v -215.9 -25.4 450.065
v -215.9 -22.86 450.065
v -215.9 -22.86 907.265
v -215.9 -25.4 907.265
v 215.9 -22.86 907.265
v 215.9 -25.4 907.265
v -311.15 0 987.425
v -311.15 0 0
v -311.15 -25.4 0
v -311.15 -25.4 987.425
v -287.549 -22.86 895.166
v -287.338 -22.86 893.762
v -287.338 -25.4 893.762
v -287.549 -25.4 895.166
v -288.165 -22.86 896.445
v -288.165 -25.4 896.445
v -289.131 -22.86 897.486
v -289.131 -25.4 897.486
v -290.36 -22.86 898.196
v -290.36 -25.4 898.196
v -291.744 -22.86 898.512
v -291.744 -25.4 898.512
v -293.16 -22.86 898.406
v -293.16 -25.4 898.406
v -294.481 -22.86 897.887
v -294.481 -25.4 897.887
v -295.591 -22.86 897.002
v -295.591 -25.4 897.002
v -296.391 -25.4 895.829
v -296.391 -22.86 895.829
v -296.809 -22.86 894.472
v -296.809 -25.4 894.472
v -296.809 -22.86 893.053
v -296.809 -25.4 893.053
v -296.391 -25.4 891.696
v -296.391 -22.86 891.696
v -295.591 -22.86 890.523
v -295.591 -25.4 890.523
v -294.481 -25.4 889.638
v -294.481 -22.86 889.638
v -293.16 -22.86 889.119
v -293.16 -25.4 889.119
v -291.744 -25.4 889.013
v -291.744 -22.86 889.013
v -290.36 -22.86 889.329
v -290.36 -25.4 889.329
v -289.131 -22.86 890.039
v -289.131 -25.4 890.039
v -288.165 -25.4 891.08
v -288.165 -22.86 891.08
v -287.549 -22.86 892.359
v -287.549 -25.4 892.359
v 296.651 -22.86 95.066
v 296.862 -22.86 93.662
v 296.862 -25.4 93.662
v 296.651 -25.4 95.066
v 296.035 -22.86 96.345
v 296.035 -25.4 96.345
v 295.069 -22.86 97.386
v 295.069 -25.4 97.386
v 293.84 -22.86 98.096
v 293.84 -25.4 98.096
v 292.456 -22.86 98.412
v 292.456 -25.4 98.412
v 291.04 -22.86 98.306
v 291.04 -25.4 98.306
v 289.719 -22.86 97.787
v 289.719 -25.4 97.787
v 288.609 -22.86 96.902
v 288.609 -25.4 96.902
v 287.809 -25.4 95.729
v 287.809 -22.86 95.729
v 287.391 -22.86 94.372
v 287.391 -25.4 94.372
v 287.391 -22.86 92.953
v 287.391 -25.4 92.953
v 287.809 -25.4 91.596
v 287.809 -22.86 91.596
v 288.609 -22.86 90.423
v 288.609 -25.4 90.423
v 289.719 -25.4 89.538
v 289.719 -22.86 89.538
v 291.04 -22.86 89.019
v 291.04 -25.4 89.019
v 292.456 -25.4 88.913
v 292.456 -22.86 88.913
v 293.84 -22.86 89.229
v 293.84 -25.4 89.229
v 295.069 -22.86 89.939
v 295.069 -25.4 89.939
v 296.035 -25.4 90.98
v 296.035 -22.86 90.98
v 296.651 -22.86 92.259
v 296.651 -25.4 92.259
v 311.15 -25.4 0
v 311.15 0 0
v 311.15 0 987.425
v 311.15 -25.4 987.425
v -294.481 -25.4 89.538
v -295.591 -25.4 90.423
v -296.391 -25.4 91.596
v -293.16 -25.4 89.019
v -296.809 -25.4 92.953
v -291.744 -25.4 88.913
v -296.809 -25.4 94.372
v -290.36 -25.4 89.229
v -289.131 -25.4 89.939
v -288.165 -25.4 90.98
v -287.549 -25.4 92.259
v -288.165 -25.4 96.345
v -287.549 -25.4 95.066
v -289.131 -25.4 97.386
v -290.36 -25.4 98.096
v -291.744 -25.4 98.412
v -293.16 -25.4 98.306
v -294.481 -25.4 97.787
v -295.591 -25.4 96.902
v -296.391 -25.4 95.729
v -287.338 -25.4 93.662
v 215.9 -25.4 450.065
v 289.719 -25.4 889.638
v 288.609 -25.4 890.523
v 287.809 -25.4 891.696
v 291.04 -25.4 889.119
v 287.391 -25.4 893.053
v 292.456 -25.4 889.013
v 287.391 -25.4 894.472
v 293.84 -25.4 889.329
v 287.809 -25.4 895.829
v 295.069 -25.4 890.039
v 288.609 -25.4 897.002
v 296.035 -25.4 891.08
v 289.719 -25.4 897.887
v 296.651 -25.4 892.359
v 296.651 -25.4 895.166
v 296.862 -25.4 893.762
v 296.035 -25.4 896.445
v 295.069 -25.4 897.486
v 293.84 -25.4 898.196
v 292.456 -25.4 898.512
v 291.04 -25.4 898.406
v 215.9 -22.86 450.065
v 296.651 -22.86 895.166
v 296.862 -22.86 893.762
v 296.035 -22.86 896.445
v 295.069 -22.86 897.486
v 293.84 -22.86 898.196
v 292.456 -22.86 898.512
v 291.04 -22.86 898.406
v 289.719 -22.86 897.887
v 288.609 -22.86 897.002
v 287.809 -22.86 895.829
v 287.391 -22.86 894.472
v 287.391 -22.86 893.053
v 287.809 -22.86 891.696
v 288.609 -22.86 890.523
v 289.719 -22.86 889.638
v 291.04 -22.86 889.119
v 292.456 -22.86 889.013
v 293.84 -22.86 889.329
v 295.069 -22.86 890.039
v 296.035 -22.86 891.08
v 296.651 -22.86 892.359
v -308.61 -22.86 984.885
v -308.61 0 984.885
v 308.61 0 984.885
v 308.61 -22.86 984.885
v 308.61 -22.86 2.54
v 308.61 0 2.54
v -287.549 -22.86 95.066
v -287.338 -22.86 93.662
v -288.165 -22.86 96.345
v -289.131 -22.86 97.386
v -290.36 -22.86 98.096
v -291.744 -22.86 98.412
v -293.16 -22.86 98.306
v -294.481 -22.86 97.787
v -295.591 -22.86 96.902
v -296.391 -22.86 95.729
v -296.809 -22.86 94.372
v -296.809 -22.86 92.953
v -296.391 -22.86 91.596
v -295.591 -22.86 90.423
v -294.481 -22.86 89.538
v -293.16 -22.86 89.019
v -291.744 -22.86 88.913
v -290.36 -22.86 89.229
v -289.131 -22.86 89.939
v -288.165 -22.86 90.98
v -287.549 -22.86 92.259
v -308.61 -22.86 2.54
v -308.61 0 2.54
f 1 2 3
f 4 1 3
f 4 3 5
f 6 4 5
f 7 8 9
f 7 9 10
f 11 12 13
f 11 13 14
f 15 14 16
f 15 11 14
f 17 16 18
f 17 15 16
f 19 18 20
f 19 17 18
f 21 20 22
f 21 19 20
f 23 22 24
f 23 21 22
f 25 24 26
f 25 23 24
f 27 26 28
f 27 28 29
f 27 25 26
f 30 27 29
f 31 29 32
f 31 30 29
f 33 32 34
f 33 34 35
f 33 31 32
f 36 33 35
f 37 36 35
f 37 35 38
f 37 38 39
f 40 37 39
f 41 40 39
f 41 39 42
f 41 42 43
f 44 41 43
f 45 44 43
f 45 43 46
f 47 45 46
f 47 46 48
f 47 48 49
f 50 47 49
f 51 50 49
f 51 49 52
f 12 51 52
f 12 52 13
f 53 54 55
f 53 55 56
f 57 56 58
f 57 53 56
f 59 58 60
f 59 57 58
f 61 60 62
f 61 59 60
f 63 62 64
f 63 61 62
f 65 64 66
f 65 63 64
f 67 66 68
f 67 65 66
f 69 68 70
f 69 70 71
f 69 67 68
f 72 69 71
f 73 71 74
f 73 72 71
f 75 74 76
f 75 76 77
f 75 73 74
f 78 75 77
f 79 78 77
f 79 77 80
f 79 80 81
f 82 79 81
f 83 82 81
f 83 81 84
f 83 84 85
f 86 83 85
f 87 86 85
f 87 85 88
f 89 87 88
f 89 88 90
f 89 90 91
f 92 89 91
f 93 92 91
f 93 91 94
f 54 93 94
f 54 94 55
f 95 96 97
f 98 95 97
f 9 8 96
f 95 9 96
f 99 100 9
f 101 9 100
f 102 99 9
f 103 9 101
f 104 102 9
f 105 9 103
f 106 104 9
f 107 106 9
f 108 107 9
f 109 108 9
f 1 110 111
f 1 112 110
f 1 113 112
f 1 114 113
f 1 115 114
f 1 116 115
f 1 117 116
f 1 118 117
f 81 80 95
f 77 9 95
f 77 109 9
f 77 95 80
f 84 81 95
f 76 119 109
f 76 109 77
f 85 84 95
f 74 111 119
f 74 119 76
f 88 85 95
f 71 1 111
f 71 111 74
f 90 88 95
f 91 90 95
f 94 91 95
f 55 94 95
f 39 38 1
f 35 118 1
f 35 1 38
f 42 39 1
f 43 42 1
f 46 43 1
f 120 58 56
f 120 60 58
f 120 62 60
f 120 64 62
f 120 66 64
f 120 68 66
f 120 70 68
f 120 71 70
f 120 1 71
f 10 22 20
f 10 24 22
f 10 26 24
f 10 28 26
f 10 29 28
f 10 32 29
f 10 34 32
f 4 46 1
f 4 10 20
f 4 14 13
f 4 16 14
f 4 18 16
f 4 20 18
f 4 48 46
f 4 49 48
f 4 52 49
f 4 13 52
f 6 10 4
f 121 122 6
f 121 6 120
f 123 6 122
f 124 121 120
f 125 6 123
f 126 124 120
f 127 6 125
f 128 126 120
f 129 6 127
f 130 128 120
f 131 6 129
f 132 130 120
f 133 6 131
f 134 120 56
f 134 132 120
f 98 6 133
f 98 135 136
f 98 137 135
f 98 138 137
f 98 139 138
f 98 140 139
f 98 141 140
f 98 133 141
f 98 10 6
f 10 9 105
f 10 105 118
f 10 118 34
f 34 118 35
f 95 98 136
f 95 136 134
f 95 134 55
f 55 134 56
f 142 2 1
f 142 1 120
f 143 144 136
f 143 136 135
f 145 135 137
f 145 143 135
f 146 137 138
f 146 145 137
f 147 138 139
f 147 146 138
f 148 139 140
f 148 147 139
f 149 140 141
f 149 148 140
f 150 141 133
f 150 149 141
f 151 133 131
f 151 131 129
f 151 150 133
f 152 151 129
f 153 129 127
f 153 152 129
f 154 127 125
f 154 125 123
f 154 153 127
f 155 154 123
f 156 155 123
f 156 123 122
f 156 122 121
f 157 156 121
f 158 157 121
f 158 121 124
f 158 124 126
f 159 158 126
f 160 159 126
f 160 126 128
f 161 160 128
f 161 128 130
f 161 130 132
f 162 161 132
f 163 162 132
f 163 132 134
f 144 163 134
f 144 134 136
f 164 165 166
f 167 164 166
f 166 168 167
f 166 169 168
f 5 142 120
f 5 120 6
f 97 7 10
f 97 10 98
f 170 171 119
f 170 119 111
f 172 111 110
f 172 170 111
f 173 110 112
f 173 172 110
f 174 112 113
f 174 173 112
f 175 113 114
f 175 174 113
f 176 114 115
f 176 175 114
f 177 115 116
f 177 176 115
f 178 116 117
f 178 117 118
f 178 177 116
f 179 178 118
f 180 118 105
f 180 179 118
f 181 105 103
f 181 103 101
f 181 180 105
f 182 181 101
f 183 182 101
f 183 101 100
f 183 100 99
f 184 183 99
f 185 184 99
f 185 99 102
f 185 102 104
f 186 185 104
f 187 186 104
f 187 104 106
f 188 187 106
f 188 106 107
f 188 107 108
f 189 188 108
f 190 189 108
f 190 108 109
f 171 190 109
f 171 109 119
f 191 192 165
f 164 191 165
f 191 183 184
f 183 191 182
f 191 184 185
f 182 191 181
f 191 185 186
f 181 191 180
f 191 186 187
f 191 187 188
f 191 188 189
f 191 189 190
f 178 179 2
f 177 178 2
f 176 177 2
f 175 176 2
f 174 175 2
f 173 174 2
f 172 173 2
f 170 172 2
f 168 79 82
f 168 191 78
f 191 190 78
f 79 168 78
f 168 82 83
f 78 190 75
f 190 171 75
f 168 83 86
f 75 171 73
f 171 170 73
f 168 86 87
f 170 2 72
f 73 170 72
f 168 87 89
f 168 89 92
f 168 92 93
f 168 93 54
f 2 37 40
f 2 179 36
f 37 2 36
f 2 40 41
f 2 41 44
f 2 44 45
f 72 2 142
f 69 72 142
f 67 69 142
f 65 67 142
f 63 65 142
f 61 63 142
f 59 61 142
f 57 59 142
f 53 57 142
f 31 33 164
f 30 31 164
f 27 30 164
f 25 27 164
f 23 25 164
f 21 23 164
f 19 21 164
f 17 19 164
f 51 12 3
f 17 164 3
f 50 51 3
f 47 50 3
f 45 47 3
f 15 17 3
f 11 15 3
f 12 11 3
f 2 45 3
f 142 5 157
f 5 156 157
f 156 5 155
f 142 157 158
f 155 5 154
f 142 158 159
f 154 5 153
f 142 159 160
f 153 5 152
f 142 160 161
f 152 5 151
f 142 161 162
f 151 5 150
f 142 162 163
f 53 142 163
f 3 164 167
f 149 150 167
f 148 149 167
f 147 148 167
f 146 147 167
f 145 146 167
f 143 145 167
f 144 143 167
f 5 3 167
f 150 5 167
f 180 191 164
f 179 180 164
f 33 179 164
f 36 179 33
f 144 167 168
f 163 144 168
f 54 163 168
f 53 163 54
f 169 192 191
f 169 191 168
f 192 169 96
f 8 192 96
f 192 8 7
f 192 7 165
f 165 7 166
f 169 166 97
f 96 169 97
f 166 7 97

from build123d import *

# Parameters (mm, degrees)
F0_W     = 622.3
F0_H     = 987.425
F0_R     = 4.7625
F0_W_2   = 431.8
F0_H_2   = 457.2
F1_DEPTH = 25.4
F2_T     = -2.54
F3_W     = 617.22
F3_H     = 22.86
F4_DEPTH = 982.345


with BuildPart() as f1:
    # F0 (on Front) → F1 (new body)
    with BuildSketch(Plane.XZ):
        with Locations((0, 493.7125)):
            Rectangle(F0_W, F0_H)
        with Locations((-292.1, 93.6625)):
            Circle(F0_R, mode=Mode.SUBTRACT)
        with Locations((292.1, 93.6625)):
            Circle(F0_R, mode=Mode.SUBTRACT)
        with Locations((-292.1, 893.7625)):
            Circle(F0_R, mode=Mode.SUBTRACT)
        with Locations((0, 678.66514)):
            Rectangle(F0_W_2, F0_H_2, mode=Mode.SUBTRACT)
        with Locations((292.1, 893.7625)):
            Circle(F0_R, mode=Mode.SUBTRACT)
    extrude(amount=F1_DEPTH)

    # F2
    f2_openings = [f1.faces().sort_by_distance(p)[0] for p in [
        (0, 0, 406.102773),
    ]]
    offset(amount=F2_T, openings=f2_openings, kind=Kind.INTERSECTION)

    # F3 (on face) → F4 (cut, through all)
    with BuildSketch(Plane.XY.offset(2.54)):
        with Locations((0, -11.43)):
            Rectangle(F3_W, F3_H)
    extrude(amount=F4_DEPTH, mode=Mode.SUBTRACT)


solid = f1.part
